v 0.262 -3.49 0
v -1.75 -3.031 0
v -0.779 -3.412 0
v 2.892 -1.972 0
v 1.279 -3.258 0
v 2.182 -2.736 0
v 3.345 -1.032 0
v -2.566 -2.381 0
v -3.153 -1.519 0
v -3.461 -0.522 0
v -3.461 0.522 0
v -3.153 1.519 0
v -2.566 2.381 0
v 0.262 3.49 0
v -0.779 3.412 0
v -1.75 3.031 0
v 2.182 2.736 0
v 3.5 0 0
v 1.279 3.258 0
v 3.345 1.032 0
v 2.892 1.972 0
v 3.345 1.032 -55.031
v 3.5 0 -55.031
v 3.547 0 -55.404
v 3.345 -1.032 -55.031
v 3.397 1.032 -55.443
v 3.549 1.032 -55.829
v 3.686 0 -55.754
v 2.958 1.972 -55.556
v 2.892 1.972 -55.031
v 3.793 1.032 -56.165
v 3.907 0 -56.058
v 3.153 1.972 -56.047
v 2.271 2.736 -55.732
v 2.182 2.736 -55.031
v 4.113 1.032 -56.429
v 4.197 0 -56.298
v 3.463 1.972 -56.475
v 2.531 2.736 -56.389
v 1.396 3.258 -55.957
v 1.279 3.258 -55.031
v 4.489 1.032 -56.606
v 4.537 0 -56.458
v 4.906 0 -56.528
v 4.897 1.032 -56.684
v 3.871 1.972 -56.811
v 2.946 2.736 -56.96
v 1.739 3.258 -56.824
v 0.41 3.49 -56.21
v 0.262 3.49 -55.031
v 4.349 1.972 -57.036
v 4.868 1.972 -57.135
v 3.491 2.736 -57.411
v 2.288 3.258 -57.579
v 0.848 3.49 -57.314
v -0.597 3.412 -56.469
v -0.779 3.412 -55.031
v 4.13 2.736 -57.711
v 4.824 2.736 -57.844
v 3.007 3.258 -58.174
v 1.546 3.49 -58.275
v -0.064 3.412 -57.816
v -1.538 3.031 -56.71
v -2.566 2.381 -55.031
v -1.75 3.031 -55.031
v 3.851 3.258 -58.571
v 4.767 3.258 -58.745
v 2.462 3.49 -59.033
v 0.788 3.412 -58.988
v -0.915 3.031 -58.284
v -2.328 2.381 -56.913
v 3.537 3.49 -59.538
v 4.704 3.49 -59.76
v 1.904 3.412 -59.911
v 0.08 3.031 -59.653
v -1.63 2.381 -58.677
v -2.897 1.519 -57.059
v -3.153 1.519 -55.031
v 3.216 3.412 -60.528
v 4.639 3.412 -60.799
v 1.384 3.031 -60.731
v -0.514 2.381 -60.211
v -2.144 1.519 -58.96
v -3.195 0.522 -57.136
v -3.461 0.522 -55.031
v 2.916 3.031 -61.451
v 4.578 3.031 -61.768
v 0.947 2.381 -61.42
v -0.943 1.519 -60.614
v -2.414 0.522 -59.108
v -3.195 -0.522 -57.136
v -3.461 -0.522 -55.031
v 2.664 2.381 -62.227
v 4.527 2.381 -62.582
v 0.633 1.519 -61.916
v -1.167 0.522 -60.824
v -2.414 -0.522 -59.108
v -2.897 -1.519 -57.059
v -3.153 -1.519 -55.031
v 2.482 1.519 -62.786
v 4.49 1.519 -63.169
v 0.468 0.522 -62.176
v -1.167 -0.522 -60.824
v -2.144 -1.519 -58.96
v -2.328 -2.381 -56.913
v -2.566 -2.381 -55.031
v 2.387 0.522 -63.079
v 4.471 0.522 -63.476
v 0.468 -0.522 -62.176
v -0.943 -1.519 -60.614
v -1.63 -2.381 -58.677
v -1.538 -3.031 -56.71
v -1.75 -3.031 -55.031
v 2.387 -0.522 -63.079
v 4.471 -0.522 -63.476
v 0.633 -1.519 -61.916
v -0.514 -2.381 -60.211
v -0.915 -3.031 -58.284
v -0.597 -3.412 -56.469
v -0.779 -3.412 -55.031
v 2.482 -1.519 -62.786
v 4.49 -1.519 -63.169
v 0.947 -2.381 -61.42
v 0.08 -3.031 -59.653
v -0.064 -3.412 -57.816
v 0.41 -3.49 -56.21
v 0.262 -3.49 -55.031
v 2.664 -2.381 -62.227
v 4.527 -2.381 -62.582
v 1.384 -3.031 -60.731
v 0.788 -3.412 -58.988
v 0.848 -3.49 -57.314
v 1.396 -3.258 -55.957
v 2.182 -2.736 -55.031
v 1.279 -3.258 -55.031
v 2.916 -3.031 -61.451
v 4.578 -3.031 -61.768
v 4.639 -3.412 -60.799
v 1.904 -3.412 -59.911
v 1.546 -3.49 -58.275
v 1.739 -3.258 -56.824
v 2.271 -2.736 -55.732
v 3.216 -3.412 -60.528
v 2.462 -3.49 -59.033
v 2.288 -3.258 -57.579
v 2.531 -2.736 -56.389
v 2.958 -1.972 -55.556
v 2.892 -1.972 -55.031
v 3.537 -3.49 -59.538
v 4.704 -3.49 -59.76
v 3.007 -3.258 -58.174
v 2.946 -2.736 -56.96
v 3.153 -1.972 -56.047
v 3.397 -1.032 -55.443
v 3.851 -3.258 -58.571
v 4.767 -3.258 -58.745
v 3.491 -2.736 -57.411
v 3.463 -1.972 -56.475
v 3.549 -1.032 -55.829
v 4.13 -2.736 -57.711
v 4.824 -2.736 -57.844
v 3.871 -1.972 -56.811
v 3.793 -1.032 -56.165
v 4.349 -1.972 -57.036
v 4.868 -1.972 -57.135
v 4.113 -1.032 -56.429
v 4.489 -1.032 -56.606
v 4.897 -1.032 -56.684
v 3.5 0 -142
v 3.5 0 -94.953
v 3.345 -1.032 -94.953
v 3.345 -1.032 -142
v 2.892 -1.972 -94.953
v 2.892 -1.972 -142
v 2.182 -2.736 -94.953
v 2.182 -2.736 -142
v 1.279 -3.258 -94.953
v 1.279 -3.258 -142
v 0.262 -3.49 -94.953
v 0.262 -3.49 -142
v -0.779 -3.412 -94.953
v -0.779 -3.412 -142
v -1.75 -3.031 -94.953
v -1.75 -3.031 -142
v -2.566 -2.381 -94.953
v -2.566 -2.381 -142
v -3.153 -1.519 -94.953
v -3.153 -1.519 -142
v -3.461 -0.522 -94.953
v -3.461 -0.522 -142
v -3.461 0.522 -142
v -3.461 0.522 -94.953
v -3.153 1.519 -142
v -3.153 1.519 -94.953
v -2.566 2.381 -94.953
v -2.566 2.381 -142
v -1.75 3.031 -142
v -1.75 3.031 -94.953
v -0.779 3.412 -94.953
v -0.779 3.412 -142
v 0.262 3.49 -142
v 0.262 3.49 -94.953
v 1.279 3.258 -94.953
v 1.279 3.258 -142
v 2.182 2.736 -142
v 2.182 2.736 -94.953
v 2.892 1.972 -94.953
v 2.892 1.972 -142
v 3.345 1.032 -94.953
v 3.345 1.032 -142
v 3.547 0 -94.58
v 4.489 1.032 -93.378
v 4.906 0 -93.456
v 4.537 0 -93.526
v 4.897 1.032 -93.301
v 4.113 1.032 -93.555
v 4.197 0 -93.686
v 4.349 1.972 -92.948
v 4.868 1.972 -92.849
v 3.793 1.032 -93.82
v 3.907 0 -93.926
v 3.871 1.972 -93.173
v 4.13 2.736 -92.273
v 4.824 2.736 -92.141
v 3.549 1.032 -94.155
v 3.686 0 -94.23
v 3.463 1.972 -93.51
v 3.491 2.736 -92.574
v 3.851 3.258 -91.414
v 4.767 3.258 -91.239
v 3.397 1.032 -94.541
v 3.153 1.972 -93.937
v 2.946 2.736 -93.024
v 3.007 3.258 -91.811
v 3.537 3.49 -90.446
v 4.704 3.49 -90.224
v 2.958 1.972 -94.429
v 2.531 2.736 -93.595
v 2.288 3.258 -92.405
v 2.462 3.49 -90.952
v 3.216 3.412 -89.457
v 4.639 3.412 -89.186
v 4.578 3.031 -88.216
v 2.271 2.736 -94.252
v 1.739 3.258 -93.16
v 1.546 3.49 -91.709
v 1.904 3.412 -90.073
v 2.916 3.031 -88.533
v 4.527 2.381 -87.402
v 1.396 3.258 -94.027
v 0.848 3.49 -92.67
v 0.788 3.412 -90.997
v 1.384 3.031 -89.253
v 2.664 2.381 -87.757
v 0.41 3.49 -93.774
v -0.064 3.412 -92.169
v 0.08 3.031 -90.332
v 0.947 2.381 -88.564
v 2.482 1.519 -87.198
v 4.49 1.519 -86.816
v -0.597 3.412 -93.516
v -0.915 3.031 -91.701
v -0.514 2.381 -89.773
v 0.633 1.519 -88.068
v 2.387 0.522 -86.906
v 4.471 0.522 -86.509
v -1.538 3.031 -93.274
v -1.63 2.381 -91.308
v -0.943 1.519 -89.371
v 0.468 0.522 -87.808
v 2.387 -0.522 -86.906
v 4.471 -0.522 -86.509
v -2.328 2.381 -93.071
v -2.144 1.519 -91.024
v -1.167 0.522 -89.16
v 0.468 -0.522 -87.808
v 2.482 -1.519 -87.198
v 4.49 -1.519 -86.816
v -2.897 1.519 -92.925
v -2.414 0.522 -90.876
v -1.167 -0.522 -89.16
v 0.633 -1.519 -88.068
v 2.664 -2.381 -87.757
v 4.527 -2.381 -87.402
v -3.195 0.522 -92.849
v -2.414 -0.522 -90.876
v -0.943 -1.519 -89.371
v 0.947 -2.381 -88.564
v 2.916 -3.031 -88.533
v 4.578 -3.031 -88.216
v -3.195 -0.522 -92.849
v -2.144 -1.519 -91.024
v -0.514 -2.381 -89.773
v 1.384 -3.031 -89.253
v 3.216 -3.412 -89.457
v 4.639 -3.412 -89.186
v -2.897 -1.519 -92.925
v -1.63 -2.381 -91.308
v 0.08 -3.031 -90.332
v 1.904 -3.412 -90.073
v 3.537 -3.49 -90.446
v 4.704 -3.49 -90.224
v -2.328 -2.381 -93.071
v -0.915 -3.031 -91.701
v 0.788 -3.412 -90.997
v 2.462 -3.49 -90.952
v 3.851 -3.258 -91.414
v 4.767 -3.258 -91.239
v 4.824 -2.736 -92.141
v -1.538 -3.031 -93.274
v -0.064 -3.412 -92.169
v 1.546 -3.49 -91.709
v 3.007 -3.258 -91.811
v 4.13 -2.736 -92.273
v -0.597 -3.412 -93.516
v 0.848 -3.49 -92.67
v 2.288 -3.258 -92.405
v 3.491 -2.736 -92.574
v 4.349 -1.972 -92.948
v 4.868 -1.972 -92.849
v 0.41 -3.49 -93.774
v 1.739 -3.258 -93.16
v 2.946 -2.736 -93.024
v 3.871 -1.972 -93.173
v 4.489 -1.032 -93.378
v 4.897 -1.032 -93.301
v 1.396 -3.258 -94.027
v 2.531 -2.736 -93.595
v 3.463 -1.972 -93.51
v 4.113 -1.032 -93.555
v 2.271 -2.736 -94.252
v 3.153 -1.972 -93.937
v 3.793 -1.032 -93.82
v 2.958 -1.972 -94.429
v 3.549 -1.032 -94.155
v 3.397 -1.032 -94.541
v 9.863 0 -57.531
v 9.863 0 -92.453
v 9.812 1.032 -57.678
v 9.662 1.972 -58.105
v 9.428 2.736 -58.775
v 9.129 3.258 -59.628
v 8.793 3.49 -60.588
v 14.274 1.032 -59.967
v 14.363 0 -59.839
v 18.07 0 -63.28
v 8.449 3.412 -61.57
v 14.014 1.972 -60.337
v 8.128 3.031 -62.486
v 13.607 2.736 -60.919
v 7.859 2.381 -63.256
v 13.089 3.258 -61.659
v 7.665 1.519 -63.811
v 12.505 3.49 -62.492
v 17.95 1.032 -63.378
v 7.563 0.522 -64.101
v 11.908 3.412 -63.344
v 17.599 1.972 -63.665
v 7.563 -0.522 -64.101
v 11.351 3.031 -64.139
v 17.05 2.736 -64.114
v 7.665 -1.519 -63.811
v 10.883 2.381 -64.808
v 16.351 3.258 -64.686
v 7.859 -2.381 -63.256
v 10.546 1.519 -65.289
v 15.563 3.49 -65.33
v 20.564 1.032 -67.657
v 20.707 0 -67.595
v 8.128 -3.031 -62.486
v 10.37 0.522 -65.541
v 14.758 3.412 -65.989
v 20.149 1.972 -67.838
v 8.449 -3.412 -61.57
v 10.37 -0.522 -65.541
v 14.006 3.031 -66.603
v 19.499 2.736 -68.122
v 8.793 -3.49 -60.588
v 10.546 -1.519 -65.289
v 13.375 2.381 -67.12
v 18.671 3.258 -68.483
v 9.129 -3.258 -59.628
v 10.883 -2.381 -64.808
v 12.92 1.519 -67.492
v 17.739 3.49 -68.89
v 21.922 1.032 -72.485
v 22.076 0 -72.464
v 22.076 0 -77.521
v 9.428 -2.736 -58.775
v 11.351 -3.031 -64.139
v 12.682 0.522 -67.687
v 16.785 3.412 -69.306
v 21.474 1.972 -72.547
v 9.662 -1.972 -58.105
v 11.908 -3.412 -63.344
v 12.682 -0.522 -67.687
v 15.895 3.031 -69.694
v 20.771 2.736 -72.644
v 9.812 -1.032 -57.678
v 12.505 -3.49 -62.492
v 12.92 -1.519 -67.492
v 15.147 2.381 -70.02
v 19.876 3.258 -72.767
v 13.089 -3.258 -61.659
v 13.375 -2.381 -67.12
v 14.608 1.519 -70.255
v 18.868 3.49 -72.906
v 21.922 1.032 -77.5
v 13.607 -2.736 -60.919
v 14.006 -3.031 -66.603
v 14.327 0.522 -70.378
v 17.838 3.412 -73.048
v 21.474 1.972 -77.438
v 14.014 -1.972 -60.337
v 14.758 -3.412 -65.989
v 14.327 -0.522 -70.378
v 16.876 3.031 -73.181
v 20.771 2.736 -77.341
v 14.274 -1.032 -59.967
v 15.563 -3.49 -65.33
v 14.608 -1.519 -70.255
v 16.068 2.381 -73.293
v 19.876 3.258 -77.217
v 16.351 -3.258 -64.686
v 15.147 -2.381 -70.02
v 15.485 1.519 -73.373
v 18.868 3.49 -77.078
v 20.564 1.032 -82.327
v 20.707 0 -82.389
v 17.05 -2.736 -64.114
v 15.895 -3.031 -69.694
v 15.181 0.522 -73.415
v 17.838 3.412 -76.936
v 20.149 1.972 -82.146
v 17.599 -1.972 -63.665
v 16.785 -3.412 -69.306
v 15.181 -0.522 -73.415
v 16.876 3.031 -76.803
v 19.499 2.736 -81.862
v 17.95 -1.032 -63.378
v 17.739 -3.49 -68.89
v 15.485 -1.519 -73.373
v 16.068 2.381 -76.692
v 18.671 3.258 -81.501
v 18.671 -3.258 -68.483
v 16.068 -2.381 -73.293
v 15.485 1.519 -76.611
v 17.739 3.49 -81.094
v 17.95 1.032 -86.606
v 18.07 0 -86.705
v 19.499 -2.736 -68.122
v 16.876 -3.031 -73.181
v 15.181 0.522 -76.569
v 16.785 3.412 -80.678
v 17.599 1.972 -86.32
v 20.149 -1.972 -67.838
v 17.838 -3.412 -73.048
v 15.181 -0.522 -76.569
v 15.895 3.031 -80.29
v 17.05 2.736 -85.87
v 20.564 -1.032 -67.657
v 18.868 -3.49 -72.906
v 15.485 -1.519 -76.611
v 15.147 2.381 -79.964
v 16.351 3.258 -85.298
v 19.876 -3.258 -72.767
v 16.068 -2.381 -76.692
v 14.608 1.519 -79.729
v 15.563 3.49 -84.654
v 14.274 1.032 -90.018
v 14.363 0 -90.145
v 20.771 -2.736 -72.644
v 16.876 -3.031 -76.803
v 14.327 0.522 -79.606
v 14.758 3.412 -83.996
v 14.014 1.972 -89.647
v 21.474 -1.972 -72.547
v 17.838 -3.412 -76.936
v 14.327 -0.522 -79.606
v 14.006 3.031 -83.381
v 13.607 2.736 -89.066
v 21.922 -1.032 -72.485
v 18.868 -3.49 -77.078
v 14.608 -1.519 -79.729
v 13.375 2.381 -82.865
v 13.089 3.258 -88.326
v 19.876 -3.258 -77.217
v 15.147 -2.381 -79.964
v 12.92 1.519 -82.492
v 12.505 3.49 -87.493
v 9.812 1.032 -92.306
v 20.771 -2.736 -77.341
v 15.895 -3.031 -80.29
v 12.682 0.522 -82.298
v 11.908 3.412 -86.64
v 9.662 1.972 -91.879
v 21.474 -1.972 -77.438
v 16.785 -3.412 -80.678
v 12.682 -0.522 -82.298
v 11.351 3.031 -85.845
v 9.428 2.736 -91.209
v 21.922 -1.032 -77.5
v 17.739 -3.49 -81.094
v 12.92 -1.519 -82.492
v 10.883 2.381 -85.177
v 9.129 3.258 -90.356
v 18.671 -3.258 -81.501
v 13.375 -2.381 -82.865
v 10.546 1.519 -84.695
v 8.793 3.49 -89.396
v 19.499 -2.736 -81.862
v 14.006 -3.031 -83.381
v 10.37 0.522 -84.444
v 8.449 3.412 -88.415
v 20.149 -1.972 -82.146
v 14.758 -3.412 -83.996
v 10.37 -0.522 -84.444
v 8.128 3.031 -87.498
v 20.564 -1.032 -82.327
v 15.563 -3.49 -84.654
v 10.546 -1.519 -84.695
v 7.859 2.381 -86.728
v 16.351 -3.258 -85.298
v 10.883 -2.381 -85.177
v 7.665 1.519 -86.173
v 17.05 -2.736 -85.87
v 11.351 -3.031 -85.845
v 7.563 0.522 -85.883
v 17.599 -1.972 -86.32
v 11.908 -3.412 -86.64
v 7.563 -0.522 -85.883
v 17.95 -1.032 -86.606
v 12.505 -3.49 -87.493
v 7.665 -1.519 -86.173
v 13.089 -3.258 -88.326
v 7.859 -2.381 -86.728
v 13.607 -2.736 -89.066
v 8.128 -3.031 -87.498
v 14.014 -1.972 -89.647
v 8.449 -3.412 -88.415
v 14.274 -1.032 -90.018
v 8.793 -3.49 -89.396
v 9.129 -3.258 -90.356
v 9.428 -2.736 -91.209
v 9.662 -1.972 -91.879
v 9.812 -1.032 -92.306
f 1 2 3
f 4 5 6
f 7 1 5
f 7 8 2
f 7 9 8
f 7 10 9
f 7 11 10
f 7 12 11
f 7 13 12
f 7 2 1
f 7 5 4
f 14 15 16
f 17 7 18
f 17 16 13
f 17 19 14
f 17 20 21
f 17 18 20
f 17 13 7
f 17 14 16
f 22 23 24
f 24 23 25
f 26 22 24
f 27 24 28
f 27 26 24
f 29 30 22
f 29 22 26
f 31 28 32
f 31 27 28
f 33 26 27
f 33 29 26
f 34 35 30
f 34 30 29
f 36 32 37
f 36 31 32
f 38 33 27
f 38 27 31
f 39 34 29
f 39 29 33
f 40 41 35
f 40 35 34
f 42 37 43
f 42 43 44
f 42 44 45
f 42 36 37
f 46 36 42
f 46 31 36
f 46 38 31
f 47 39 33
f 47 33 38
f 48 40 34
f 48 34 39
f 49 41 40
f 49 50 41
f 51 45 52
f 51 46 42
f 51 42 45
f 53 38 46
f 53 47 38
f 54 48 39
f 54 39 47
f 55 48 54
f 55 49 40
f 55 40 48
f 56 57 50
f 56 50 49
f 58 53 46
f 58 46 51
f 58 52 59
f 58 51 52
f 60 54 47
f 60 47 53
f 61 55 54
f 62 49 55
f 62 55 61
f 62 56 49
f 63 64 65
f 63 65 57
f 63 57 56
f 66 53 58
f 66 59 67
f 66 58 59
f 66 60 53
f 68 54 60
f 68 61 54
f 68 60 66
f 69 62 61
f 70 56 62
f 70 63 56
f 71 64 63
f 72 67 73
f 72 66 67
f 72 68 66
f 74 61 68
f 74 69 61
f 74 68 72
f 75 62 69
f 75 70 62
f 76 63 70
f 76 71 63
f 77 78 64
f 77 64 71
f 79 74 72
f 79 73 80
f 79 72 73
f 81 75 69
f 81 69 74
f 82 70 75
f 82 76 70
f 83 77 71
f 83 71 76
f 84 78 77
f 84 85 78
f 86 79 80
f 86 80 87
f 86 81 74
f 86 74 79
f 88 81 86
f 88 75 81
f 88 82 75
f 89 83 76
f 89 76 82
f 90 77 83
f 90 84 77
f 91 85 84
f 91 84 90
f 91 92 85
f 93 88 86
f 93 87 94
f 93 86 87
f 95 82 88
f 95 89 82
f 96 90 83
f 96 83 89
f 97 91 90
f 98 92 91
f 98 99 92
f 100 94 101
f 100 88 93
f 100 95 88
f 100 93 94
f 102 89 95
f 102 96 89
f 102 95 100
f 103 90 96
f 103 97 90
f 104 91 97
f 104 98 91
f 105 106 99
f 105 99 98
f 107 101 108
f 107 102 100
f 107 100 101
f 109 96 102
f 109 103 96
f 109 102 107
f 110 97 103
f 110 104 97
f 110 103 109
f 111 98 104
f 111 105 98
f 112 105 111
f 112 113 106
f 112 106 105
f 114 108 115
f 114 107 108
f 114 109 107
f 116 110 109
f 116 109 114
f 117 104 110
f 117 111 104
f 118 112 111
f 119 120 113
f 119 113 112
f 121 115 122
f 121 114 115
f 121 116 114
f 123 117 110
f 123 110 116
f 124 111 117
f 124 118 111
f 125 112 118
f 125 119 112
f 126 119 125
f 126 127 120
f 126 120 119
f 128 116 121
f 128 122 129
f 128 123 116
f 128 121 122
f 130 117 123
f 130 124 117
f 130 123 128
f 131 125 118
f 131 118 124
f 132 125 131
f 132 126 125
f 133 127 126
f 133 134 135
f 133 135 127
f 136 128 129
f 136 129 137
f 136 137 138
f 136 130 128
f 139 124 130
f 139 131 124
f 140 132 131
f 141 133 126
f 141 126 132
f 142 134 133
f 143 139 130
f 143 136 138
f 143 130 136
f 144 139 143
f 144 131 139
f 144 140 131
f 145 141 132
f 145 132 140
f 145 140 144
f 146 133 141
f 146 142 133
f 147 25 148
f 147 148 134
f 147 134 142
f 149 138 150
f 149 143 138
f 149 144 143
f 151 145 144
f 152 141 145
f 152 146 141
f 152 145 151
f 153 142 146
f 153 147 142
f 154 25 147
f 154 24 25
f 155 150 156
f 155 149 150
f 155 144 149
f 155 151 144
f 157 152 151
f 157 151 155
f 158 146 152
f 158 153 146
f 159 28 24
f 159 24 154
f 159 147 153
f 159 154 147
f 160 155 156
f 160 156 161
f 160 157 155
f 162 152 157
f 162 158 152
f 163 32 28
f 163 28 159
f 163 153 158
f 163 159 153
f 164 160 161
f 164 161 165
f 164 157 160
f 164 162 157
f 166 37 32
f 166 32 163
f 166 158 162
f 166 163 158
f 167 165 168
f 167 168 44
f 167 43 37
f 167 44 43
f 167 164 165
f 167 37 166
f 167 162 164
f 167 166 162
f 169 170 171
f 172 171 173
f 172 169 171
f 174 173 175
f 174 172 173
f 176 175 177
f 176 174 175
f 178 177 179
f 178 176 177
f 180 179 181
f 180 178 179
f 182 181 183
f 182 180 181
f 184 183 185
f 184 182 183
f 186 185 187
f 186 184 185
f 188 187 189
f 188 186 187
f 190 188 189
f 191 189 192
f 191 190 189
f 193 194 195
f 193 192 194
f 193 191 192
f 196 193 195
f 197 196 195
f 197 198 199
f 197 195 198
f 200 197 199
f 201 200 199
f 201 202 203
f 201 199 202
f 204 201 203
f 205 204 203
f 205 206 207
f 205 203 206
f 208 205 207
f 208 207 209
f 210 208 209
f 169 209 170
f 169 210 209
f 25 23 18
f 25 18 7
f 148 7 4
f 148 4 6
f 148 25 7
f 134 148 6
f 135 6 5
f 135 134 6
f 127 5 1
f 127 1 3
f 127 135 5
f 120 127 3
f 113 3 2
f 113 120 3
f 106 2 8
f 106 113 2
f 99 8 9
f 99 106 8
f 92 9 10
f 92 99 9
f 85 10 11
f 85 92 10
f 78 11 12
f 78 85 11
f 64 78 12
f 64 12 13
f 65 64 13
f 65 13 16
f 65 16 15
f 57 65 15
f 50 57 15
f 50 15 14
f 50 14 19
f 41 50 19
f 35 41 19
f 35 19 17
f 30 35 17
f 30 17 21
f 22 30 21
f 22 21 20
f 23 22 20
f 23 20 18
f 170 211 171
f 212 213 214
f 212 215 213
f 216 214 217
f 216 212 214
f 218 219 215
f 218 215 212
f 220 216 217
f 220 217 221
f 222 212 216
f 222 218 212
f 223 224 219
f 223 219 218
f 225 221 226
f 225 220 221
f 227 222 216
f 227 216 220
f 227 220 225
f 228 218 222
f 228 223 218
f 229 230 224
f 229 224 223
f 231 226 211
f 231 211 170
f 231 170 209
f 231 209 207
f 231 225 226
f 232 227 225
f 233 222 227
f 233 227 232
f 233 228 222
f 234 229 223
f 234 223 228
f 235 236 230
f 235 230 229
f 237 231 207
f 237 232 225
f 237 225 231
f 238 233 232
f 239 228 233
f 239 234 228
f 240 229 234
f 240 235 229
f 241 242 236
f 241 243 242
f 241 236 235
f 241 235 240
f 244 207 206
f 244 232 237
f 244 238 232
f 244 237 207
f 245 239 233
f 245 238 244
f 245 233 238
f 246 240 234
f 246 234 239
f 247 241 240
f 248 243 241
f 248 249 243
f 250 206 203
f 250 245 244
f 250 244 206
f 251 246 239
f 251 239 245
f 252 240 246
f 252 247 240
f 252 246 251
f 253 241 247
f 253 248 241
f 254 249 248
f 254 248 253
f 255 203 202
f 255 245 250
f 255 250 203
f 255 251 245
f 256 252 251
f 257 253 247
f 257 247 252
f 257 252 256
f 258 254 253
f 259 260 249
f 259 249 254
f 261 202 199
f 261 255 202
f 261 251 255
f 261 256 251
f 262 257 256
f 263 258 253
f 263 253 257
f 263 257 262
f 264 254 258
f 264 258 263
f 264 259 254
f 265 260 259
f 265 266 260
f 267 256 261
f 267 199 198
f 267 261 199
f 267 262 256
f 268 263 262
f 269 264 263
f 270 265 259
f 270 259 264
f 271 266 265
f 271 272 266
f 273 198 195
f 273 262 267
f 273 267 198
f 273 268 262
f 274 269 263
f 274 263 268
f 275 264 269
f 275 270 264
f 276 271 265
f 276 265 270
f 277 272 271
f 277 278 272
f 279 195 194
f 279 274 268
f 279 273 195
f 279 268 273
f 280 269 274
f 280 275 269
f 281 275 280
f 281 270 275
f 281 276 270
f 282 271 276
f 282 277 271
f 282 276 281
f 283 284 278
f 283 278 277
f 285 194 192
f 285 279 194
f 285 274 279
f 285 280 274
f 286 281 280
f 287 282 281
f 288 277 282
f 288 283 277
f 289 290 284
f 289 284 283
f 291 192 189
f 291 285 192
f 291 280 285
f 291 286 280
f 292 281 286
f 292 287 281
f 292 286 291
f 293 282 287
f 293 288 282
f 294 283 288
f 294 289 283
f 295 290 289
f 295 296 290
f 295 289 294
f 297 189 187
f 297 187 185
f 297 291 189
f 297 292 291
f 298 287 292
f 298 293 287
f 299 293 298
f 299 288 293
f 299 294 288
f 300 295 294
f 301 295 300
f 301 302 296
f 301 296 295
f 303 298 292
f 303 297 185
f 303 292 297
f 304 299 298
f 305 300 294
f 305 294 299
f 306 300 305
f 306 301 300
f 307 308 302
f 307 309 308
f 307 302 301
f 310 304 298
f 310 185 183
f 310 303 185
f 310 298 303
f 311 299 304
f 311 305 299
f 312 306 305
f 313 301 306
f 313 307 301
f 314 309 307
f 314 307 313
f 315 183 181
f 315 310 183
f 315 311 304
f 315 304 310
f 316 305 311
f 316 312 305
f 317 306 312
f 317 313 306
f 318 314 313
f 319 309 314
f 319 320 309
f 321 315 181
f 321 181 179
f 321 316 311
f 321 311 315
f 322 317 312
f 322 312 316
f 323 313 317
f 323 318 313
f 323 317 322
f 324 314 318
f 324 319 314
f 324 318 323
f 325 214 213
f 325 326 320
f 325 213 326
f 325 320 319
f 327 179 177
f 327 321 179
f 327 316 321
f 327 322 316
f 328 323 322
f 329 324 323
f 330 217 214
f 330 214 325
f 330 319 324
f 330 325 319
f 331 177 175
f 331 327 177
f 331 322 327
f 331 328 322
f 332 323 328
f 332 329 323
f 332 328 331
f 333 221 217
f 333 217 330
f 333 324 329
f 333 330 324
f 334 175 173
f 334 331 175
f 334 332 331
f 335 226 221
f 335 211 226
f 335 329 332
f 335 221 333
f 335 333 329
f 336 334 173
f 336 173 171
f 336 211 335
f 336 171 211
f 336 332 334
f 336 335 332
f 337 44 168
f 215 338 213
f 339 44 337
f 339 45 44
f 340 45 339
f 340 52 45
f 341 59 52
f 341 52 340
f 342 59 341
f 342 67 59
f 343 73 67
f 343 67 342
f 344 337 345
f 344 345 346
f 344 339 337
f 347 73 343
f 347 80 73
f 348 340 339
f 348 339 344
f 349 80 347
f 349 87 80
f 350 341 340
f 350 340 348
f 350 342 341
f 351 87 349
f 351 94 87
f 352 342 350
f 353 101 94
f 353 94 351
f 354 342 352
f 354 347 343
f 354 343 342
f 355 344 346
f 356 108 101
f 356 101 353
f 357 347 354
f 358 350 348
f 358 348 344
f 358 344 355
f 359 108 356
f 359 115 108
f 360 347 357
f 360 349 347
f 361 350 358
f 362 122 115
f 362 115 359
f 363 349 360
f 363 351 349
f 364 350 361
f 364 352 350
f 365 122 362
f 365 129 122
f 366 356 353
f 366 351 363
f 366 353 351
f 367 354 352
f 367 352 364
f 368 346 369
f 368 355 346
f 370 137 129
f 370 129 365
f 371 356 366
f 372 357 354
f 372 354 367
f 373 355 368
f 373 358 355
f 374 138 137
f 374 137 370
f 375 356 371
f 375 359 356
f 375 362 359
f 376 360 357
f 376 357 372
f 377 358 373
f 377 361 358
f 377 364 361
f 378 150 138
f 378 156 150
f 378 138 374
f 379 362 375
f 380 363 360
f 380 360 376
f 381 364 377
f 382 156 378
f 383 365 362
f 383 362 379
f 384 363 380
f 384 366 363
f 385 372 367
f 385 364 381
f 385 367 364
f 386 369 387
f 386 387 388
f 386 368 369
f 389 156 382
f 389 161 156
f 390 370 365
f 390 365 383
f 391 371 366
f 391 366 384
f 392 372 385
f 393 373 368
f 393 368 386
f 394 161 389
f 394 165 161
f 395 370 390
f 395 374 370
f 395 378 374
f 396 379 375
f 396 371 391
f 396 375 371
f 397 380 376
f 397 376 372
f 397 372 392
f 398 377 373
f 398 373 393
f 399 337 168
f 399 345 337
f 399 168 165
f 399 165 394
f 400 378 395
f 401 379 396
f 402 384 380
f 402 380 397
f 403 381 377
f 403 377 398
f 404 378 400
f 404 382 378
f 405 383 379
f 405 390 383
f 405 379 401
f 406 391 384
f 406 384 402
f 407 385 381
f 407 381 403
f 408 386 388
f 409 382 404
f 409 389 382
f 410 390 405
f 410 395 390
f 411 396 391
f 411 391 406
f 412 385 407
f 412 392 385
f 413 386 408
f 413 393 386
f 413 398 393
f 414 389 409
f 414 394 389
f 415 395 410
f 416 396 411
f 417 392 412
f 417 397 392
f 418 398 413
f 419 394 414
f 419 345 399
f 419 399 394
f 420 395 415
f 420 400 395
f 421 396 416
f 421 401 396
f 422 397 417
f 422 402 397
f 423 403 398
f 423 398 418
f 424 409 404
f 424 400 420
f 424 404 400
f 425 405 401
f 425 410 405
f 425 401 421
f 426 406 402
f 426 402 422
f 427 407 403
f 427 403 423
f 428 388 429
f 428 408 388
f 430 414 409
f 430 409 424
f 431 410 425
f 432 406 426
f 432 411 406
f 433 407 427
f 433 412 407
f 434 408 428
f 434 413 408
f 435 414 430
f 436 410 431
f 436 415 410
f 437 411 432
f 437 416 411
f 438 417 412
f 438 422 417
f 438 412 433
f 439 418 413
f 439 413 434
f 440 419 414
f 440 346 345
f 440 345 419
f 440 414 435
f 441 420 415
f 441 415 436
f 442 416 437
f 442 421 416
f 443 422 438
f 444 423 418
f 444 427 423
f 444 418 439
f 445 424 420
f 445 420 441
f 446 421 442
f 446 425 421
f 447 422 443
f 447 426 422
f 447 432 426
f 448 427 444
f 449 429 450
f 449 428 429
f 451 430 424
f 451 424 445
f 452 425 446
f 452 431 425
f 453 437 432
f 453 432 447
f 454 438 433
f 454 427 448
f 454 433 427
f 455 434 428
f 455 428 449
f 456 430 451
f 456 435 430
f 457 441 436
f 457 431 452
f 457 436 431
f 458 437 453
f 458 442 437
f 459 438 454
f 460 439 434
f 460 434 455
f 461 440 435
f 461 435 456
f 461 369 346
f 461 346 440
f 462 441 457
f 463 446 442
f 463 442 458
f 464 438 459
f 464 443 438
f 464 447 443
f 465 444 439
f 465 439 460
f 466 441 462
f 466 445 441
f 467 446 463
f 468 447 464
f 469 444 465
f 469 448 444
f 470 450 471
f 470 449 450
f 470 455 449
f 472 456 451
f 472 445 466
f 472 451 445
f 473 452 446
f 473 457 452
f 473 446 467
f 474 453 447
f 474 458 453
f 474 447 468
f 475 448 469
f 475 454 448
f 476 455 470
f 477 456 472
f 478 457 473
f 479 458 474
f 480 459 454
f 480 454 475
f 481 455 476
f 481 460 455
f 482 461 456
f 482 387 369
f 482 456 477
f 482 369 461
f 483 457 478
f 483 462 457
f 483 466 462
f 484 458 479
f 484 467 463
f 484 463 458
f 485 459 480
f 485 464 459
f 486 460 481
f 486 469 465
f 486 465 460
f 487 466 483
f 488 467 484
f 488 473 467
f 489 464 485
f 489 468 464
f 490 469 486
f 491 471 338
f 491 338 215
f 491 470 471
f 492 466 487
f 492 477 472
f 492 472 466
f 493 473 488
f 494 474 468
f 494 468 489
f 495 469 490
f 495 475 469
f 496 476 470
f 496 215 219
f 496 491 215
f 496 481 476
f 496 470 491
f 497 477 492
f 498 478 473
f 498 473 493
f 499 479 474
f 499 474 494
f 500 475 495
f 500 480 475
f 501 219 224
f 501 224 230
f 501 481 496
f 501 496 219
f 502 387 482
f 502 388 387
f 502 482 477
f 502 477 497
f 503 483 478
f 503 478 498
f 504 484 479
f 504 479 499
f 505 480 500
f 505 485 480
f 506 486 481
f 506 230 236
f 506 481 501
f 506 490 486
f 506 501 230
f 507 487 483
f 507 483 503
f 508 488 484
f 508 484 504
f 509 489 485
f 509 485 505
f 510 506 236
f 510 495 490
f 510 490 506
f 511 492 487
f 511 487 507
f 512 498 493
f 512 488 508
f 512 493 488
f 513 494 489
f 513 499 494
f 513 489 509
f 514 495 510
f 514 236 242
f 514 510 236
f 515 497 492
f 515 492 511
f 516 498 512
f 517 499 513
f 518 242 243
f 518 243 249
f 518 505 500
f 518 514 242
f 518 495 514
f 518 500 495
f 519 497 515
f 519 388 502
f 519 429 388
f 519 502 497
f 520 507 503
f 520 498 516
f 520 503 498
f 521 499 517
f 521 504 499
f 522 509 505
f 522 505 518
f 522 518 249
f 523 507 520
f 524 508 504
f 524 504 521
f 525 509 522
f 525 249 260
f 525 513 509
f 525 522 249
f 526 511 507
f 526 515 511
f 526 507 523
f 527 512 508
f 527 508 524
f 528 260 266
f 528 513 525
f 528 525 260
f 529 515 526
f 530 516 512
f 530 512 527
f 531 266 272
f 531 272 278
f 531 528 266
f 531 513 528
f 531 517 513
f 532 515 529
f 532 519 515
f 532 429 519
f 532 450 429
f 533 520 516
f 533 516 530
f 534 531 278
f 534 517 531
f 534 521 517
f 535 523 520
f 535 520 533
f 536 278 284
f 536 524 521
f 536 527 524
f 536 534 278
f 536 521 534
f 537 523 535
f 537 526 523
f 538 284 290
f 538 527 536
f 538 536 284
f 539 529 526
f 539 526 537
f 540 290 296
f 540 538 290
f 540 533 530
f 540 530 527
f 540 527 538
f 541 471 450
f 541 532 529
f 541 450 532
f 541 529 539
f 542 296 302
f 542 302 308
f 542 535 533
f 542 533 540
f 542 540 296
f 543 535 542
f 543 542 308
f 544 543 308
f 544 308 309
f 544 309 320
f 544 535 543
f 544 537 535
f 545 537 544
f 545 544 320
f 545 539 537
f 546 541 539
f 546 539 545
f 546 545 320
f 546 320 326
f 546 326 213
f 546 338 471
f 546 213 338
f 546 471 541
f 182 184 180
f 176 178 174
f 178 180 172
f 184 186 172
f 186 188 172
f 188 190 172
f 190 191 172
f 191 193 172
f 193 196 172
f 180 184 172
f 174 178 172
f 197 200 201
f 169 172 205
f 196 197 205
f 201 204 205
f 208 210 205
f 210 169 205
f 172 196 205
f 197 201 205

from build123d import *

# Parameters (mm, degrees)
CROQUIS2_R = 3.5


with BuildPart() as part:
    # Barrer2: sweep along a path in Croquis1
    with BuildLine(Plane(origin=(0, 0, 0), x_dir=(1, 0, 0), z_dir=(0, 1, 0))) as barrer2_path:
        Line((0, 0), (0, 55.031280577))
        ThreePointArc((0, 55.031280577), (1.355655066, 58.454546562), (4.6875, 60.021505397))
        ThreePointArc((4.6875, 60.021505397), (18.75, 74.992179856), (4.6875, 89.962854314))
        ThreePointArc((4.6875, 89.962854314), (1.355655066, 91.52981315), (0, 94.953079134))
        Line((0, 94.953079134), (0, 142))
    # Croquis2 → Barrer2 (sweep)
    with BuildSketch(Plane.XY):
        Circle(CROQUIS2_R)
    sweep(path=barrer2_path.line)


solid = part.part
